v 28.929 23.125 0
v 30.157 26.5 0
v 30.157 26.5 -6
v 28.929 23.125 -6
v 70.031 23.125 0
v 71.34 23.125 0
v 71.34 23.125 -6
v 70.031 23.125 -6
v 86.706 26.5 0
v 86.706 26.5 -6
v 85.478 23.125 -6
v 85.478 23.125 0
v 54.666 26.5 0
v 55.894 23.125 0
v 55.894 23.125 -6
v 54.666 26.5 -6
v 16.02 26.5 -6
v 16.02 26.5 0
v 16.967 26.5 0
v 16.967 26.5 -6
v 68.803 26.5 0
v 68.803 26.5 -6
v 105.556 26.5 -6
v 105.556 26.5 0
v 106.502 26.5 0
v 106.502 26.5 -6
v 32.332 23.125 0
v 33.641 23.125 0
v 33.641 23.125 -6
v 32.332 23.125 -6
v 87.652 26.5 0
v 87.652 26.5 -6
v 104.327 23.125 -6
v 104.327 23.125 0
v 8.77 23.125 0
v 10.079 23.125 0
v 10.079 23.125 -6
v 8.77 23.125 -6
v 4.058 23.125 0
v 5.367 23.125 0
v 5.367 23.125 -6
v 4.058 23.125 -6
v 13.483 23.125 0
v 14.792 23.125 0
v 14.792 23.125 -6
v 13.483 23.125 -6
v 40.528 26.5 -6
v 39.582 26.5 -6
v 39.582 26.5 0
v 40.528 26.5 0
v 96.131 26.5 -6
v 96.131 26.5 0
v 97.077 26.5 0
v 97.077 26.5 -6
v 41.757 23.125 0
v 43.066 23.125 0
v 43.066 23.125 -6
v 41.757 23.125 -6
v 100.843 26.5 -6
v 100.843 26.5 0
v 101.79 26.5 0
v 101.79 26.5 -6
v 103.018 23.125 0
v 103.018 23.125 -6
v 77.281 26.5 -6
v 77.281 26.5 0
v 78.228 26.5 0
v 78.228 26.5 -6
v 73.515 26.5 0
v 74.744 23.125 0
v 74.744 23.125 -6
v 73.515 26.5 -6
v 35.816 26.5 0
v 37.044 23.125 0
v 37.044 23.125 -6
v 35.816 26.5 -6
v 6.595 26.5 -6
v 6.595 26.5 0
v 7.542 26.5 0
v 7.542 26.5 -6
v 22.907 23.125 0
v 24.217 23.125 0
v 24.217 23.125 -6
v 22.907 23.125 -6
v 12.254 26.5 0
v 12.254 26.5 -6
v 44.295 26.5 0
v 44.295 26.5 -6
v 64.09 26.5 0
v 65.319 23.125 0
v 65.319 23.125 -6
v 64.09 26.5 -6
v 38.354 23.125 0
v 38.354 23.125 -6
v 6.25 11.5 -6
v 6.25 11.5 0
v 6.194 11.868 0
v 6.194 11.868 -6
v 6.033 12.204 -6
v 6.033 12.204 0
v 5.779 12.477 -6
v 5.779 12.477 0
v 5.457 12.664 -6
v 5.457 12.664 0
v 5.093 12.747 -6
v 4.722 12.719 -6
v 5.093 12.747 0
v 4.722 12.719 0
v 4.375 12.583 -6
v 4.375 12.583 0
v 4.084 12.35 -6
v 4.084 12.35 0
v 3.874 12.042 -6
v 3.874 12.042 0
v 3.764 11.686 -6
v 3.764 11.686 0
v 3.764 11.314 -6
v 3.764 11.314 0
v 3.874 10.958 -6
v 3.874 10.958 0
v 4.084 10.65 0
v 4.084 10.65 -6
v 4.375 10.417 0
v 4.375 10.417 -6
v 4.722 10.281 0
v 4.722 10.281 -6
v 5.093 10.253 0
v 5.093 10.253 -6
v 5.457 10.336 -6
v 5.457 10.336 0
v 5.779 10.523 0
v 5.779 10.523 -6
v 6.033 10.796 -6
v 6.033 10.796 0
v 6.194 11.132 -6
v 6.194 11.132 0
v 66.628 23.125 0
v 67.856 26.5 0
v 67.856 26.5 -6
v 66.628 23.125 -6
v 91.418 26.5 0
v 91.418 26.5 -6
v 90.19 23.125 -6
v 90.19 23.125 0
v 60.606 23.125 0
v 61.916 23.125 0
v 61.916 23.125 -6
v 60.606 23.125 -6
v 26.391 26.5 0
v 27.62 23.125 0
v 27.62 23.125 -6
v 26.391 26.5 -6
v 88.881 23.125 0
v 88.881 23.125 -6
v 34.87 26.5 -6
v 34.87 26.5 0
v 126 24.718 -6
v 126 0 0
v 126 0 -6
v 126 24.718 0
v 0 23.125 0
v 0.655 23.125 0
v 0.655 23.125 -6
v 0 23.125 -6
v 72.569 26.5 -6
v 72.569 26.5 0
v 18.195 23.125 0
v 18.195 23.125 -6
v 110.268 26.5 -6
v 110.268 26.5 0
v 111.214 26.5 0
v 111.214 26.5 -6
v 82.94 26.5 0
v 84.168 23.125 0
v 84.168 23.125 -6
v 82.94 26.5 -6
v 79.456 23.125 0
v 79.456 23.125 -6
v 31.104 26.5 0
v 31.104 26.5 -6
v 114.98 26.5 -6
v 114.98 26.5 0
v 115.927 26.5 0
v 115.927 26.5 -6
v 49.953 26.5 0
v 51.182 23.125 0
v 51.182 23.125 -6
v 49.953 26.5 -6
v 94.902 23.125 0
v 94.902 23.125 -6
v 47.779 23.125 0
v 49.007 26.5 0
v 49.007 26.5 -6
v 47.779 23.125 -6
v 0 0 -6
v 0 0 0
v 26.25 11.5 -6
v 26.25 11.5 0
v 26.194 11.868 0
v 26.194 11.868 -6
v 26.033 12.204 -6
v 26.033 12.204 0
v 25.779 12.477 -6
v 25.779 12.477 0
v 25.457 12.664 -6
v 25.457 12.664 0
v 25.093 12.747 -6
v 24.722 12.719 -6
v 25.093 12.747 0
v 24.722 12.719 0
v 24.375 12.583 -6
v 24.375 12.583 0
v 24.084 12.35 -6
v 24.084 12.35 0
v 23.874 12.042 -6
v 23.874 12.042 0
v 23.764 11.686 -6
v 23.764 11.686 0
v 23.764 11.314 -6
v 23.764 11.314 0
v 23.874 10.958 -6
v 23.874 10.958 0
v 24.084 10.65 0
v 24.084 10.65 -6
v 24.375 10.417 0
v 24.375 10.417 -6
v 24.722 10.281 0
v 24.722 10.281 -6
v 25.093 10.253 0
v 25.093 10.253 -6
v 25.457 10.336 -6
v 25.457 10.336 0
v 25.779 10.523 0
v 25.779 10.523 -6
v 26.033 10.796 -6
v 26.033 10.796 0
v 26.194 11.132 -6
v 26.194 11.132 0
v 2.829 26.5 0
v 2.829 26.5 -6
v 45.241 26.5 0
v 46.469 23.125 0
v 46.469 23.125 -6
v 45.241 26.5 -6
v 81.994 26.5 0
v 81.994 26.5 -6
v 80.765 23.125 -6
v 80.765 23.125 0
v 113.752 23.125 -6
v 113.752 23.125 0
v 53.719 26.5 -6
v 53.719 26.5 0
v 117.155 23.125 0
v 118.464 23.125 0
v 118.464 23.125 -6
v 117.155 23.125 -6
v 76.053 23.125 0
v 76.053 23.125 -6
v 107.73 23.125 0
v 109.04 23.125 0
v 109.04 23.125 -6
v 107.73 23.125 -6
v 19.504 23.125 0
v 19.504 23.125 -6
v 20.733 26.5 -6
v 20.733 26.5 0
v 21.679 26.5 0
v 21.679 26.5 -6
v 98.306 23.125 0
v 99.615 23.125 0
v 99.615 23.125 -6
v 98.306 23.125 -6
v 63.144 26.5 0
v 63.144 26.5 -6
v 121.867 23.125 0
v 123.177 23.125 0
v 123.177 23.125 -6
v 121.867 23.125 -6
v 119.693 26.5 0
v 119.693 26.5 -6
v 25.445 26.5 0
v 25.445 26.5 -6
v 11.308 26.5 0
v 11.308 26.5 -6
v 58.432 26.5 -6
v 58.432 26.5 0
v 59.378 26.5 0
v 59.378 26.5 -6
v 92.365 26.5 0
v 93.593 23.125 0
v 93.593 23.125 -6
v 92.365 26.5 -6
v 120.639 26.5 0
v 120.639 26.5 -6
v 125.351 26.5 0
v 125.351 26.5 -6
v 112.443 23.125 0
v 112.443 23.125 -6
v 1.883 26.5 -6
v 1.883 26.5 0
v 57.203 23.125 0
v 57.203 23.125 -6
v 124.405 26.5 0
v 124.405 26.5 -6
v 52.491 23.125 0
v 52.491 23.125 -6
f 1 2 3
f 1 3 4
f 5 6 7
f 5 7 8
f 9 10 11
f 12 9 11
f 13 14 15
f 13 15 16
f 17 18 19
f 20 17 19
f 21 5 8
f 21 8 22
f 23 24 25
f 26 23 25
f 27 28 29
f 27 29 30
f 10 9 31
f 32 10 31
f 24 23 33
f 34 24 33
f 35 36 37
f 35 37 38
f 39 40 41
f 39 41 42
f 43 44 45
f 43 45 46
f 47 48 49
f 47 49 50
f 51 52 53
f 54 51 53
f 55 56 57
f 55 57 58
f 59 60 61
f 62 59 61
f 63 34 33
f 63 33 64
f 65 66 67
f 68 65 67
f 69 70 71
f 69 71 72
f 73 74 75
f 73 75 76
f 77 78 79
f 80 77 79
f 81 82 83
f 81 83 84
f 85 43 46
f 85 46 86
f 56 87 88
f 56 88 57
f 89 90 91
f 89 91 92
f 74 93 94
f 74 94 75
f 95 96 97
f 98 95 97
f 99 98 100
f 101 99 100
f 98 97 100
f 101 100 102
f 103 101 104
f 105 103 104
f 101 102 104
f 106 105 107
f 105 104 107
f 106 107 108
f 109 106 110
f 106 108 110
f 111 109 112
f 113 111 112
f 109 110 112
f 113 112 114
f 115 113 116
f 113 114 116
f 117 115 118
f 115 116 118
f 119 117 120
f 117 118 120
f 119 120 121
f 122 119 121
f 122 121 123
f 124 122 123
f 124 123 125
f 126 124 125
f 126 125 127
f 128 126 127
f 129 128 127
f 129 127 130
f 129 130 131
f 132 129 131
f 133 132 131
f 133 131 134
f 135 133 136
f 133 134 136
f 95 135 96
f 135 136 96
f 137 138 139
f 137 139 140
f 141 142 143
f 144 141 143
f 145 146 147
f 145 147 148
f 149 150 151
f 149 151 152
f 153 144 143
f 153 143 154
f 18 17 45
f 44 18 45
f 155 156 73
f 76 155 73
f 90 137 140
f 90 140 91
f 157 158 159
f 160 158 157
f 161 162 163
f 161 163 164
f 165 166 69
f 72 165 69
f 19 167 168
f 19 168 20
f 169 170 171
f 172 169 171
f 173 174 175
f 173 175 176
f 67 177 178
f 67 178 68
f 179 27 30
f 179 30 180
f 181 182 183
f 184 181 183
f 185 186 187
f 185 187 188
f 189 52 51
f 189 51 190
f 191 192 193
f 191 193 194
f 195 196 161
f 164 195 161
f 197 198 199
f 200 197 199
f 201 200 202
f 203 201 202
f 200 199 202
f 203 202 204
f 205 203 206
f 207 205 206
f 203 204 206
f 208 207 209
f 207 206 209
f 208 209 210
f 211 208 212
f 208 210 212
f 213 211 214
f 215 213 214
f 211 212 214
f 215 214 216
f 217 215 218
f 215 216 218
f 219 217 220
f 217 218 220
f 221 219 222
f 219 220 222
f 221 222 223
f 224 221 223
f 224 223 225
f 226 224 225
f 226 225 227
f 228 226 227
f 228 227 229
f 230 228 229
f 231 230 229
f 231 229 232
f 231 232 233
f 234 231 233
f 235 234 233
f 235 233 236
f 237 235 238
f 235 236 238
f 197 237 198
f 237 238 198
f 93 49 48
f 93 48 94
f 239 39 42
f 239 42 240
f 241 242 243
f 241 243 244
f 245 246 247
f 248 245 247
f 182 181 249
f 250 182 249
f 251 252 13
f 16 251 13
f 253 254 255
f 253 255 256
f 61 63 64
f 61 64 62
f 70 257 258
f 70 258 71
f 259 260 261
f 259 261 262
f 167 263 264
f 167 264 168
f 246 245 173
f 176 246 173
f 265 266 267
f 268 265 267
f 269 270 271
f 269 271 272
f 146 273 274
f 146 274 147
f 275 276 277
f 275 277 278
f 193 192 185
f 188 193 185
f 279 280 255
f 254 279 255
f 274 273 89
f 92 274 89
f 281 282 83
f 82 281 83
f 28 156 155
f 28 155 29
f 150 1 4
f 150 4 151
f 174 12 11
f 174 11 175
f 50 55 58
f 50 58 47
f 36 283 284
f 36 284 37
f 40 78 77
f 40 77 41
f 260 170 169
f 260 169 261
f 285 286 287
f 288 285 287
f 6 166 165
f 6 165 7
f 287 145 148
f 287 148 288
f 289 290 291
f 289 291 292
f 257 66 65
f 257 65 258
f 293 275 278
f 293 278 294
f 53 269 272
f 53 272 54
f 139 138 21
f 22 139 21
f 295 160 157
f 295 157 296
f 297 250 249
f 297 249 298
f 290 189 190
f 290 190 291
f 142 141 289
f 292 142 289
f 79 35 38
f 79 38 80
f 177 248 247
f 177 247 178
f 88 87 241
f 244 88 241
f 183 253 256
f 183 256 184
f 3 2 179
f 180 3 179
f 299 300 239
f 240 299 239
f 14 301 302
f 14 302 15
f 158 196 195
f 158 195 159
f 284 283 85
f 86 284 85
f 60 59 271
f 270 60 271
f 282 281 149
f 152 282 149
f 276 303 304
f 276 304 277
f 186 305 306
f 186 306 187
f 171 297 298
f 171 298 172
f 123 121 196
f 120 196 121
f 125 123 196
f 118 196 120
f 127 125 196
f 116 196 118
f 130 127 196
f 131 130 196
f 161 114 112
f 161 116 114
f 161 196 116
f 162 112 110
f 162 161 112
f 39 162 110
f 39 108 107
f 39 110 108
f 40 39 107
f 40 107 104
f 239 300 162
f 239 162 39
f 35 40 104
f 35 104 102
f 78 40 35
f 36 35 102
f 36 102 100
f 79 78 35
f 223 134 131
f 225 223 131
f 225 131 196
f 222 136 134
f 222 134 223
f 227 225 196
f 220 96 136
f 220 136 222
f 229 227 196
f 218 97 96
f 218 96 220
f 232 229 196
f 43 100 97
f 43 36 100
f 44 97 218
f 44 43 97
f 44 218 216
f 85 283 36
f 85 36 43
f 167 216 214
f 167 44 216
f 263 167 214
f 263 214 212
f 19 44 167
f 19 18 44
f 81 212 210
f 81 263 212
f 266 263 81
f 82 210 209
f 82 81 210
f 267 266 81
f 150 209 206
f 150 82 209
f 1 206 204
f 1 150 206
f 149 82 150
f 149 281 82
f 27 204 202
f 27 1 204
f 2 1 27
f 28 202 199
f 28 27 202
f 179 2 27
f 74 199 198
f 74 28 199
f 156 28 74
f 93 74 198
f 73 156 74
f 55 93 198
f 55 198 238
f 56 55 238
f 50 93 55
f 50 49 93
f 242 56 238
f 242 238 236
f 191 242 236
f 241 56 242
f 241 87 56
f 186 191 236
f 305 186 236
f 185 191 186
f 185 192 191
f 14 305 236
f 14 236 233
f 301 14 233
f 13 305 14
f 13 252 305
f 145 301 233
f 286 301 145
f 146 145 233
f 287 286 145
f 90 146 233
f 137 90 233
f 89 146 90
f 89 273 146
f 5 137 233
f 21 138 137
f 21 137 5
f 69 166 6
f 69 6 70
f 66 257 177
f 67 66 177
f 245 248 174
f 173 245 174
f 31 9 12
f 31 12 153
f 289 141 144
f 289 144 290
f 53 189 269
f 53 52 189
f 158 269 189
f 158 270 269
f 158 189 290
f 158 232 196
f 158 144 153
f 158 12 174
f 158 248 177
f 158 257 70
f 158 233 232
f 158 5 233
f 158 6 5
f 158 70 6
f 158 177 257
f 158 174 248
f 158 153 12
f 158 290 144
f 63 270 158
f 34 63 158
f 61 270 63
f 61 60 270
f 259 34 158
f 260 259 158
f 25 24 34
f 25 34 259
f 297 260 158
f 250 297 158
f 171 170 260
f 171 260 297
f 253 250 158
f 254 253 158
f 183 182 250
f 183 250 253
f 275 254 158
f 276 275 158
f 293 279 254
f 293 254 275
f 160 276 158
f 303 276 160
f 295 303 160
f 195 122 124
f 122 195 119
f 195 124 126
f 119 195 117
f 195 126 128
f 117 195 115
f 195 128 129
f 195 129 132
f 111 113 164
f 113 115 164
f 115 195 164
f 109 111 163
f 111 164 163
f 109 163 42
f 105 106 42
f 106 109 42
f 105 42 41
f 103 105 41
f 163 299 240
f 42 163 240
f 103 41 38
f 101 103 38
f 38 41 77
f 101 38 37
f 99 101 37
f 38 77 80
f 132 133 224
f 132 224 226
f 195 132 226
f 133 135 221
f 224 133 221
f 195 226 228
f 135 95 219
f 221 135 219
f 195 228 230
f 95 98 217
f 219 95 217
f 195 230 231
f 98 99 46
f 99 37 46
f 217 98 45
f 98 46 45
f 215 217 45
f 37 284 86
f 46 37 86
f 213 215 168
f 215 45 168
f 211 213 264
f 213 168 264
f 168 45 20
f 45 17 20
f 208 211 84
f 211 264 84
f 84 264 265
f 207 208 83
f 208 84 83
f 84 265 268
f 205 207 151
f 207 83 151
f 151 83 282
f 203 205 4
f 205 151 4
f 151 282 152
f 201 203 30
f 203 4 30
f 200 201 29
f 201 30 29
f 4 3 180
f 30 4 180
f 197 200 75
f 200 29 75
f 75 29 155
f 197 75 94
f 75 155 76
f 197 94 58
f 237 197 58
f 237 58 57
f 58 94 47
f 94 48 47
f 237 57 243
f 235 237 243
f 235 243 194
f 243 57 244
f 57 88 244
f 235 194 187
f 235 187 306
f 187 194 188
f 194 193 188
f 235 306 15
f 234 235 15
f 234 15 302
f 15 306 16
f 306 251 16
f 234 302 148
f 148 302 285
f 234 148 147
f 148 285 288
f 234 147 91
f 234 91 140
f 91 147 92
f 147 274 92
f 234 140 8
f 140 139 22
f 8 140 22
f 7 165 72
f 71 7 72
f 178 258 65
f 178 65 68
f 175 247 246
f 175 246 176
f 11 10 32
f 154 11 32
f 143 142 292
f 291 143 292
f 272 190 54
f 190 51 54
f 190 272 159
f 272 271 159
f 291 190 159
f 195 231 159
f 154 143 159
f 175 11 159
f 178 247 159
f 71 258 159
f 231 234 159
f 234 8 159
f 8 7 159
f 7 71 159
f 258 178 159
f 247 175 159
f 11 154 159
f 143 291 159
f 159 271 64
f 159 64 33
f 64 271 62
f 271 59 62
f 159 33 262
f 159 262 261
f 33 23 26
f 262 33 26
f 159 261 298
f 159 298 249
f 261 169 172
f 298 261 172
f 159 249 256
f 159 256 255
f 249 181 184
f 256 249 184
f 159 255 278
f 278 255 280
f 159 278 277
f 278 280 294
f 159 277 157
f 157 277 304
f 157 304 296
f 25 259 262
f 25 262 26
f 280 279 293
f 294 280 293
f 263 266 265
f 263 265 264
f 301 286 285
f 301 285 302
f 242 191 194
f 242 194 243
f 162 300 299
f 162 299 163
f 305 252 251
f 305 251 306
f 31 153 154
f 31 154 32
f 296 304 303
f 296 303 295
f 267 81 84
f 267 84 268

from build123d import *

# Parameters (mm, degrees)
BLANKSKE_W              = 126
BLANKSKE_H              = 26.5
BLANK_DEPTH             = 6
TOOTHCUTSIM_DEPTH       = 129.896276129
TEETHCUTS_COUNT         = 33
TEETHCUTS_PITCH         = 4.712388975
ESQUISSE1_R             = 1.25
ENL_V_MAT_EXTRU_1_DEPTH = 6


with BuildPart() as part:
    # BlankSke → Blank (new body)
    with BuildSketch(Plane.XY):
        with Locations((63, 13.25)):
            Rectangle(BLANKSKE_W, BLANKSKE_H)
    extrude(amount=-BLANK_DEPTH)

    # TooCutSkeSim → ToothCutSim (cut, through all)
    with BuildSketch(Plane.XY):
        Polygon((0.654653055, 23.125), (-0.654653055, 23.125), (-1.892297439, 26.5254), (1.892297439, 26.5254), align=None)
    toothcutsim = extrude(amount=-TOOTHCUTSIM_DEPTH, mode=Mode.SUBTRACT)

    # TeethCuts: ToothCutSim ×33
    with Locations(*[(i * TEETHCUTS_PITCH, 0, 0) for i in range(1, TEETHCUTS_COUNT)]):
        add(toothcutsim, mode=Mode.SUBTRACT)

    # Esquisse1 → Enlèv. mat.-Extru.1 (cut)
    with BuildSketch(Plane.XY):
        with Locations((5, 11.5)):
            Circle(ESQUISSE1_R)
        with Locations((25, 11.5)):
            Circle(ESQUISSE1_R)
    extrude(amount=-ENL_V_MAT_EXTRU_1_DEPTH, mode=Mode.SUBTRACT)


solid = part.part
